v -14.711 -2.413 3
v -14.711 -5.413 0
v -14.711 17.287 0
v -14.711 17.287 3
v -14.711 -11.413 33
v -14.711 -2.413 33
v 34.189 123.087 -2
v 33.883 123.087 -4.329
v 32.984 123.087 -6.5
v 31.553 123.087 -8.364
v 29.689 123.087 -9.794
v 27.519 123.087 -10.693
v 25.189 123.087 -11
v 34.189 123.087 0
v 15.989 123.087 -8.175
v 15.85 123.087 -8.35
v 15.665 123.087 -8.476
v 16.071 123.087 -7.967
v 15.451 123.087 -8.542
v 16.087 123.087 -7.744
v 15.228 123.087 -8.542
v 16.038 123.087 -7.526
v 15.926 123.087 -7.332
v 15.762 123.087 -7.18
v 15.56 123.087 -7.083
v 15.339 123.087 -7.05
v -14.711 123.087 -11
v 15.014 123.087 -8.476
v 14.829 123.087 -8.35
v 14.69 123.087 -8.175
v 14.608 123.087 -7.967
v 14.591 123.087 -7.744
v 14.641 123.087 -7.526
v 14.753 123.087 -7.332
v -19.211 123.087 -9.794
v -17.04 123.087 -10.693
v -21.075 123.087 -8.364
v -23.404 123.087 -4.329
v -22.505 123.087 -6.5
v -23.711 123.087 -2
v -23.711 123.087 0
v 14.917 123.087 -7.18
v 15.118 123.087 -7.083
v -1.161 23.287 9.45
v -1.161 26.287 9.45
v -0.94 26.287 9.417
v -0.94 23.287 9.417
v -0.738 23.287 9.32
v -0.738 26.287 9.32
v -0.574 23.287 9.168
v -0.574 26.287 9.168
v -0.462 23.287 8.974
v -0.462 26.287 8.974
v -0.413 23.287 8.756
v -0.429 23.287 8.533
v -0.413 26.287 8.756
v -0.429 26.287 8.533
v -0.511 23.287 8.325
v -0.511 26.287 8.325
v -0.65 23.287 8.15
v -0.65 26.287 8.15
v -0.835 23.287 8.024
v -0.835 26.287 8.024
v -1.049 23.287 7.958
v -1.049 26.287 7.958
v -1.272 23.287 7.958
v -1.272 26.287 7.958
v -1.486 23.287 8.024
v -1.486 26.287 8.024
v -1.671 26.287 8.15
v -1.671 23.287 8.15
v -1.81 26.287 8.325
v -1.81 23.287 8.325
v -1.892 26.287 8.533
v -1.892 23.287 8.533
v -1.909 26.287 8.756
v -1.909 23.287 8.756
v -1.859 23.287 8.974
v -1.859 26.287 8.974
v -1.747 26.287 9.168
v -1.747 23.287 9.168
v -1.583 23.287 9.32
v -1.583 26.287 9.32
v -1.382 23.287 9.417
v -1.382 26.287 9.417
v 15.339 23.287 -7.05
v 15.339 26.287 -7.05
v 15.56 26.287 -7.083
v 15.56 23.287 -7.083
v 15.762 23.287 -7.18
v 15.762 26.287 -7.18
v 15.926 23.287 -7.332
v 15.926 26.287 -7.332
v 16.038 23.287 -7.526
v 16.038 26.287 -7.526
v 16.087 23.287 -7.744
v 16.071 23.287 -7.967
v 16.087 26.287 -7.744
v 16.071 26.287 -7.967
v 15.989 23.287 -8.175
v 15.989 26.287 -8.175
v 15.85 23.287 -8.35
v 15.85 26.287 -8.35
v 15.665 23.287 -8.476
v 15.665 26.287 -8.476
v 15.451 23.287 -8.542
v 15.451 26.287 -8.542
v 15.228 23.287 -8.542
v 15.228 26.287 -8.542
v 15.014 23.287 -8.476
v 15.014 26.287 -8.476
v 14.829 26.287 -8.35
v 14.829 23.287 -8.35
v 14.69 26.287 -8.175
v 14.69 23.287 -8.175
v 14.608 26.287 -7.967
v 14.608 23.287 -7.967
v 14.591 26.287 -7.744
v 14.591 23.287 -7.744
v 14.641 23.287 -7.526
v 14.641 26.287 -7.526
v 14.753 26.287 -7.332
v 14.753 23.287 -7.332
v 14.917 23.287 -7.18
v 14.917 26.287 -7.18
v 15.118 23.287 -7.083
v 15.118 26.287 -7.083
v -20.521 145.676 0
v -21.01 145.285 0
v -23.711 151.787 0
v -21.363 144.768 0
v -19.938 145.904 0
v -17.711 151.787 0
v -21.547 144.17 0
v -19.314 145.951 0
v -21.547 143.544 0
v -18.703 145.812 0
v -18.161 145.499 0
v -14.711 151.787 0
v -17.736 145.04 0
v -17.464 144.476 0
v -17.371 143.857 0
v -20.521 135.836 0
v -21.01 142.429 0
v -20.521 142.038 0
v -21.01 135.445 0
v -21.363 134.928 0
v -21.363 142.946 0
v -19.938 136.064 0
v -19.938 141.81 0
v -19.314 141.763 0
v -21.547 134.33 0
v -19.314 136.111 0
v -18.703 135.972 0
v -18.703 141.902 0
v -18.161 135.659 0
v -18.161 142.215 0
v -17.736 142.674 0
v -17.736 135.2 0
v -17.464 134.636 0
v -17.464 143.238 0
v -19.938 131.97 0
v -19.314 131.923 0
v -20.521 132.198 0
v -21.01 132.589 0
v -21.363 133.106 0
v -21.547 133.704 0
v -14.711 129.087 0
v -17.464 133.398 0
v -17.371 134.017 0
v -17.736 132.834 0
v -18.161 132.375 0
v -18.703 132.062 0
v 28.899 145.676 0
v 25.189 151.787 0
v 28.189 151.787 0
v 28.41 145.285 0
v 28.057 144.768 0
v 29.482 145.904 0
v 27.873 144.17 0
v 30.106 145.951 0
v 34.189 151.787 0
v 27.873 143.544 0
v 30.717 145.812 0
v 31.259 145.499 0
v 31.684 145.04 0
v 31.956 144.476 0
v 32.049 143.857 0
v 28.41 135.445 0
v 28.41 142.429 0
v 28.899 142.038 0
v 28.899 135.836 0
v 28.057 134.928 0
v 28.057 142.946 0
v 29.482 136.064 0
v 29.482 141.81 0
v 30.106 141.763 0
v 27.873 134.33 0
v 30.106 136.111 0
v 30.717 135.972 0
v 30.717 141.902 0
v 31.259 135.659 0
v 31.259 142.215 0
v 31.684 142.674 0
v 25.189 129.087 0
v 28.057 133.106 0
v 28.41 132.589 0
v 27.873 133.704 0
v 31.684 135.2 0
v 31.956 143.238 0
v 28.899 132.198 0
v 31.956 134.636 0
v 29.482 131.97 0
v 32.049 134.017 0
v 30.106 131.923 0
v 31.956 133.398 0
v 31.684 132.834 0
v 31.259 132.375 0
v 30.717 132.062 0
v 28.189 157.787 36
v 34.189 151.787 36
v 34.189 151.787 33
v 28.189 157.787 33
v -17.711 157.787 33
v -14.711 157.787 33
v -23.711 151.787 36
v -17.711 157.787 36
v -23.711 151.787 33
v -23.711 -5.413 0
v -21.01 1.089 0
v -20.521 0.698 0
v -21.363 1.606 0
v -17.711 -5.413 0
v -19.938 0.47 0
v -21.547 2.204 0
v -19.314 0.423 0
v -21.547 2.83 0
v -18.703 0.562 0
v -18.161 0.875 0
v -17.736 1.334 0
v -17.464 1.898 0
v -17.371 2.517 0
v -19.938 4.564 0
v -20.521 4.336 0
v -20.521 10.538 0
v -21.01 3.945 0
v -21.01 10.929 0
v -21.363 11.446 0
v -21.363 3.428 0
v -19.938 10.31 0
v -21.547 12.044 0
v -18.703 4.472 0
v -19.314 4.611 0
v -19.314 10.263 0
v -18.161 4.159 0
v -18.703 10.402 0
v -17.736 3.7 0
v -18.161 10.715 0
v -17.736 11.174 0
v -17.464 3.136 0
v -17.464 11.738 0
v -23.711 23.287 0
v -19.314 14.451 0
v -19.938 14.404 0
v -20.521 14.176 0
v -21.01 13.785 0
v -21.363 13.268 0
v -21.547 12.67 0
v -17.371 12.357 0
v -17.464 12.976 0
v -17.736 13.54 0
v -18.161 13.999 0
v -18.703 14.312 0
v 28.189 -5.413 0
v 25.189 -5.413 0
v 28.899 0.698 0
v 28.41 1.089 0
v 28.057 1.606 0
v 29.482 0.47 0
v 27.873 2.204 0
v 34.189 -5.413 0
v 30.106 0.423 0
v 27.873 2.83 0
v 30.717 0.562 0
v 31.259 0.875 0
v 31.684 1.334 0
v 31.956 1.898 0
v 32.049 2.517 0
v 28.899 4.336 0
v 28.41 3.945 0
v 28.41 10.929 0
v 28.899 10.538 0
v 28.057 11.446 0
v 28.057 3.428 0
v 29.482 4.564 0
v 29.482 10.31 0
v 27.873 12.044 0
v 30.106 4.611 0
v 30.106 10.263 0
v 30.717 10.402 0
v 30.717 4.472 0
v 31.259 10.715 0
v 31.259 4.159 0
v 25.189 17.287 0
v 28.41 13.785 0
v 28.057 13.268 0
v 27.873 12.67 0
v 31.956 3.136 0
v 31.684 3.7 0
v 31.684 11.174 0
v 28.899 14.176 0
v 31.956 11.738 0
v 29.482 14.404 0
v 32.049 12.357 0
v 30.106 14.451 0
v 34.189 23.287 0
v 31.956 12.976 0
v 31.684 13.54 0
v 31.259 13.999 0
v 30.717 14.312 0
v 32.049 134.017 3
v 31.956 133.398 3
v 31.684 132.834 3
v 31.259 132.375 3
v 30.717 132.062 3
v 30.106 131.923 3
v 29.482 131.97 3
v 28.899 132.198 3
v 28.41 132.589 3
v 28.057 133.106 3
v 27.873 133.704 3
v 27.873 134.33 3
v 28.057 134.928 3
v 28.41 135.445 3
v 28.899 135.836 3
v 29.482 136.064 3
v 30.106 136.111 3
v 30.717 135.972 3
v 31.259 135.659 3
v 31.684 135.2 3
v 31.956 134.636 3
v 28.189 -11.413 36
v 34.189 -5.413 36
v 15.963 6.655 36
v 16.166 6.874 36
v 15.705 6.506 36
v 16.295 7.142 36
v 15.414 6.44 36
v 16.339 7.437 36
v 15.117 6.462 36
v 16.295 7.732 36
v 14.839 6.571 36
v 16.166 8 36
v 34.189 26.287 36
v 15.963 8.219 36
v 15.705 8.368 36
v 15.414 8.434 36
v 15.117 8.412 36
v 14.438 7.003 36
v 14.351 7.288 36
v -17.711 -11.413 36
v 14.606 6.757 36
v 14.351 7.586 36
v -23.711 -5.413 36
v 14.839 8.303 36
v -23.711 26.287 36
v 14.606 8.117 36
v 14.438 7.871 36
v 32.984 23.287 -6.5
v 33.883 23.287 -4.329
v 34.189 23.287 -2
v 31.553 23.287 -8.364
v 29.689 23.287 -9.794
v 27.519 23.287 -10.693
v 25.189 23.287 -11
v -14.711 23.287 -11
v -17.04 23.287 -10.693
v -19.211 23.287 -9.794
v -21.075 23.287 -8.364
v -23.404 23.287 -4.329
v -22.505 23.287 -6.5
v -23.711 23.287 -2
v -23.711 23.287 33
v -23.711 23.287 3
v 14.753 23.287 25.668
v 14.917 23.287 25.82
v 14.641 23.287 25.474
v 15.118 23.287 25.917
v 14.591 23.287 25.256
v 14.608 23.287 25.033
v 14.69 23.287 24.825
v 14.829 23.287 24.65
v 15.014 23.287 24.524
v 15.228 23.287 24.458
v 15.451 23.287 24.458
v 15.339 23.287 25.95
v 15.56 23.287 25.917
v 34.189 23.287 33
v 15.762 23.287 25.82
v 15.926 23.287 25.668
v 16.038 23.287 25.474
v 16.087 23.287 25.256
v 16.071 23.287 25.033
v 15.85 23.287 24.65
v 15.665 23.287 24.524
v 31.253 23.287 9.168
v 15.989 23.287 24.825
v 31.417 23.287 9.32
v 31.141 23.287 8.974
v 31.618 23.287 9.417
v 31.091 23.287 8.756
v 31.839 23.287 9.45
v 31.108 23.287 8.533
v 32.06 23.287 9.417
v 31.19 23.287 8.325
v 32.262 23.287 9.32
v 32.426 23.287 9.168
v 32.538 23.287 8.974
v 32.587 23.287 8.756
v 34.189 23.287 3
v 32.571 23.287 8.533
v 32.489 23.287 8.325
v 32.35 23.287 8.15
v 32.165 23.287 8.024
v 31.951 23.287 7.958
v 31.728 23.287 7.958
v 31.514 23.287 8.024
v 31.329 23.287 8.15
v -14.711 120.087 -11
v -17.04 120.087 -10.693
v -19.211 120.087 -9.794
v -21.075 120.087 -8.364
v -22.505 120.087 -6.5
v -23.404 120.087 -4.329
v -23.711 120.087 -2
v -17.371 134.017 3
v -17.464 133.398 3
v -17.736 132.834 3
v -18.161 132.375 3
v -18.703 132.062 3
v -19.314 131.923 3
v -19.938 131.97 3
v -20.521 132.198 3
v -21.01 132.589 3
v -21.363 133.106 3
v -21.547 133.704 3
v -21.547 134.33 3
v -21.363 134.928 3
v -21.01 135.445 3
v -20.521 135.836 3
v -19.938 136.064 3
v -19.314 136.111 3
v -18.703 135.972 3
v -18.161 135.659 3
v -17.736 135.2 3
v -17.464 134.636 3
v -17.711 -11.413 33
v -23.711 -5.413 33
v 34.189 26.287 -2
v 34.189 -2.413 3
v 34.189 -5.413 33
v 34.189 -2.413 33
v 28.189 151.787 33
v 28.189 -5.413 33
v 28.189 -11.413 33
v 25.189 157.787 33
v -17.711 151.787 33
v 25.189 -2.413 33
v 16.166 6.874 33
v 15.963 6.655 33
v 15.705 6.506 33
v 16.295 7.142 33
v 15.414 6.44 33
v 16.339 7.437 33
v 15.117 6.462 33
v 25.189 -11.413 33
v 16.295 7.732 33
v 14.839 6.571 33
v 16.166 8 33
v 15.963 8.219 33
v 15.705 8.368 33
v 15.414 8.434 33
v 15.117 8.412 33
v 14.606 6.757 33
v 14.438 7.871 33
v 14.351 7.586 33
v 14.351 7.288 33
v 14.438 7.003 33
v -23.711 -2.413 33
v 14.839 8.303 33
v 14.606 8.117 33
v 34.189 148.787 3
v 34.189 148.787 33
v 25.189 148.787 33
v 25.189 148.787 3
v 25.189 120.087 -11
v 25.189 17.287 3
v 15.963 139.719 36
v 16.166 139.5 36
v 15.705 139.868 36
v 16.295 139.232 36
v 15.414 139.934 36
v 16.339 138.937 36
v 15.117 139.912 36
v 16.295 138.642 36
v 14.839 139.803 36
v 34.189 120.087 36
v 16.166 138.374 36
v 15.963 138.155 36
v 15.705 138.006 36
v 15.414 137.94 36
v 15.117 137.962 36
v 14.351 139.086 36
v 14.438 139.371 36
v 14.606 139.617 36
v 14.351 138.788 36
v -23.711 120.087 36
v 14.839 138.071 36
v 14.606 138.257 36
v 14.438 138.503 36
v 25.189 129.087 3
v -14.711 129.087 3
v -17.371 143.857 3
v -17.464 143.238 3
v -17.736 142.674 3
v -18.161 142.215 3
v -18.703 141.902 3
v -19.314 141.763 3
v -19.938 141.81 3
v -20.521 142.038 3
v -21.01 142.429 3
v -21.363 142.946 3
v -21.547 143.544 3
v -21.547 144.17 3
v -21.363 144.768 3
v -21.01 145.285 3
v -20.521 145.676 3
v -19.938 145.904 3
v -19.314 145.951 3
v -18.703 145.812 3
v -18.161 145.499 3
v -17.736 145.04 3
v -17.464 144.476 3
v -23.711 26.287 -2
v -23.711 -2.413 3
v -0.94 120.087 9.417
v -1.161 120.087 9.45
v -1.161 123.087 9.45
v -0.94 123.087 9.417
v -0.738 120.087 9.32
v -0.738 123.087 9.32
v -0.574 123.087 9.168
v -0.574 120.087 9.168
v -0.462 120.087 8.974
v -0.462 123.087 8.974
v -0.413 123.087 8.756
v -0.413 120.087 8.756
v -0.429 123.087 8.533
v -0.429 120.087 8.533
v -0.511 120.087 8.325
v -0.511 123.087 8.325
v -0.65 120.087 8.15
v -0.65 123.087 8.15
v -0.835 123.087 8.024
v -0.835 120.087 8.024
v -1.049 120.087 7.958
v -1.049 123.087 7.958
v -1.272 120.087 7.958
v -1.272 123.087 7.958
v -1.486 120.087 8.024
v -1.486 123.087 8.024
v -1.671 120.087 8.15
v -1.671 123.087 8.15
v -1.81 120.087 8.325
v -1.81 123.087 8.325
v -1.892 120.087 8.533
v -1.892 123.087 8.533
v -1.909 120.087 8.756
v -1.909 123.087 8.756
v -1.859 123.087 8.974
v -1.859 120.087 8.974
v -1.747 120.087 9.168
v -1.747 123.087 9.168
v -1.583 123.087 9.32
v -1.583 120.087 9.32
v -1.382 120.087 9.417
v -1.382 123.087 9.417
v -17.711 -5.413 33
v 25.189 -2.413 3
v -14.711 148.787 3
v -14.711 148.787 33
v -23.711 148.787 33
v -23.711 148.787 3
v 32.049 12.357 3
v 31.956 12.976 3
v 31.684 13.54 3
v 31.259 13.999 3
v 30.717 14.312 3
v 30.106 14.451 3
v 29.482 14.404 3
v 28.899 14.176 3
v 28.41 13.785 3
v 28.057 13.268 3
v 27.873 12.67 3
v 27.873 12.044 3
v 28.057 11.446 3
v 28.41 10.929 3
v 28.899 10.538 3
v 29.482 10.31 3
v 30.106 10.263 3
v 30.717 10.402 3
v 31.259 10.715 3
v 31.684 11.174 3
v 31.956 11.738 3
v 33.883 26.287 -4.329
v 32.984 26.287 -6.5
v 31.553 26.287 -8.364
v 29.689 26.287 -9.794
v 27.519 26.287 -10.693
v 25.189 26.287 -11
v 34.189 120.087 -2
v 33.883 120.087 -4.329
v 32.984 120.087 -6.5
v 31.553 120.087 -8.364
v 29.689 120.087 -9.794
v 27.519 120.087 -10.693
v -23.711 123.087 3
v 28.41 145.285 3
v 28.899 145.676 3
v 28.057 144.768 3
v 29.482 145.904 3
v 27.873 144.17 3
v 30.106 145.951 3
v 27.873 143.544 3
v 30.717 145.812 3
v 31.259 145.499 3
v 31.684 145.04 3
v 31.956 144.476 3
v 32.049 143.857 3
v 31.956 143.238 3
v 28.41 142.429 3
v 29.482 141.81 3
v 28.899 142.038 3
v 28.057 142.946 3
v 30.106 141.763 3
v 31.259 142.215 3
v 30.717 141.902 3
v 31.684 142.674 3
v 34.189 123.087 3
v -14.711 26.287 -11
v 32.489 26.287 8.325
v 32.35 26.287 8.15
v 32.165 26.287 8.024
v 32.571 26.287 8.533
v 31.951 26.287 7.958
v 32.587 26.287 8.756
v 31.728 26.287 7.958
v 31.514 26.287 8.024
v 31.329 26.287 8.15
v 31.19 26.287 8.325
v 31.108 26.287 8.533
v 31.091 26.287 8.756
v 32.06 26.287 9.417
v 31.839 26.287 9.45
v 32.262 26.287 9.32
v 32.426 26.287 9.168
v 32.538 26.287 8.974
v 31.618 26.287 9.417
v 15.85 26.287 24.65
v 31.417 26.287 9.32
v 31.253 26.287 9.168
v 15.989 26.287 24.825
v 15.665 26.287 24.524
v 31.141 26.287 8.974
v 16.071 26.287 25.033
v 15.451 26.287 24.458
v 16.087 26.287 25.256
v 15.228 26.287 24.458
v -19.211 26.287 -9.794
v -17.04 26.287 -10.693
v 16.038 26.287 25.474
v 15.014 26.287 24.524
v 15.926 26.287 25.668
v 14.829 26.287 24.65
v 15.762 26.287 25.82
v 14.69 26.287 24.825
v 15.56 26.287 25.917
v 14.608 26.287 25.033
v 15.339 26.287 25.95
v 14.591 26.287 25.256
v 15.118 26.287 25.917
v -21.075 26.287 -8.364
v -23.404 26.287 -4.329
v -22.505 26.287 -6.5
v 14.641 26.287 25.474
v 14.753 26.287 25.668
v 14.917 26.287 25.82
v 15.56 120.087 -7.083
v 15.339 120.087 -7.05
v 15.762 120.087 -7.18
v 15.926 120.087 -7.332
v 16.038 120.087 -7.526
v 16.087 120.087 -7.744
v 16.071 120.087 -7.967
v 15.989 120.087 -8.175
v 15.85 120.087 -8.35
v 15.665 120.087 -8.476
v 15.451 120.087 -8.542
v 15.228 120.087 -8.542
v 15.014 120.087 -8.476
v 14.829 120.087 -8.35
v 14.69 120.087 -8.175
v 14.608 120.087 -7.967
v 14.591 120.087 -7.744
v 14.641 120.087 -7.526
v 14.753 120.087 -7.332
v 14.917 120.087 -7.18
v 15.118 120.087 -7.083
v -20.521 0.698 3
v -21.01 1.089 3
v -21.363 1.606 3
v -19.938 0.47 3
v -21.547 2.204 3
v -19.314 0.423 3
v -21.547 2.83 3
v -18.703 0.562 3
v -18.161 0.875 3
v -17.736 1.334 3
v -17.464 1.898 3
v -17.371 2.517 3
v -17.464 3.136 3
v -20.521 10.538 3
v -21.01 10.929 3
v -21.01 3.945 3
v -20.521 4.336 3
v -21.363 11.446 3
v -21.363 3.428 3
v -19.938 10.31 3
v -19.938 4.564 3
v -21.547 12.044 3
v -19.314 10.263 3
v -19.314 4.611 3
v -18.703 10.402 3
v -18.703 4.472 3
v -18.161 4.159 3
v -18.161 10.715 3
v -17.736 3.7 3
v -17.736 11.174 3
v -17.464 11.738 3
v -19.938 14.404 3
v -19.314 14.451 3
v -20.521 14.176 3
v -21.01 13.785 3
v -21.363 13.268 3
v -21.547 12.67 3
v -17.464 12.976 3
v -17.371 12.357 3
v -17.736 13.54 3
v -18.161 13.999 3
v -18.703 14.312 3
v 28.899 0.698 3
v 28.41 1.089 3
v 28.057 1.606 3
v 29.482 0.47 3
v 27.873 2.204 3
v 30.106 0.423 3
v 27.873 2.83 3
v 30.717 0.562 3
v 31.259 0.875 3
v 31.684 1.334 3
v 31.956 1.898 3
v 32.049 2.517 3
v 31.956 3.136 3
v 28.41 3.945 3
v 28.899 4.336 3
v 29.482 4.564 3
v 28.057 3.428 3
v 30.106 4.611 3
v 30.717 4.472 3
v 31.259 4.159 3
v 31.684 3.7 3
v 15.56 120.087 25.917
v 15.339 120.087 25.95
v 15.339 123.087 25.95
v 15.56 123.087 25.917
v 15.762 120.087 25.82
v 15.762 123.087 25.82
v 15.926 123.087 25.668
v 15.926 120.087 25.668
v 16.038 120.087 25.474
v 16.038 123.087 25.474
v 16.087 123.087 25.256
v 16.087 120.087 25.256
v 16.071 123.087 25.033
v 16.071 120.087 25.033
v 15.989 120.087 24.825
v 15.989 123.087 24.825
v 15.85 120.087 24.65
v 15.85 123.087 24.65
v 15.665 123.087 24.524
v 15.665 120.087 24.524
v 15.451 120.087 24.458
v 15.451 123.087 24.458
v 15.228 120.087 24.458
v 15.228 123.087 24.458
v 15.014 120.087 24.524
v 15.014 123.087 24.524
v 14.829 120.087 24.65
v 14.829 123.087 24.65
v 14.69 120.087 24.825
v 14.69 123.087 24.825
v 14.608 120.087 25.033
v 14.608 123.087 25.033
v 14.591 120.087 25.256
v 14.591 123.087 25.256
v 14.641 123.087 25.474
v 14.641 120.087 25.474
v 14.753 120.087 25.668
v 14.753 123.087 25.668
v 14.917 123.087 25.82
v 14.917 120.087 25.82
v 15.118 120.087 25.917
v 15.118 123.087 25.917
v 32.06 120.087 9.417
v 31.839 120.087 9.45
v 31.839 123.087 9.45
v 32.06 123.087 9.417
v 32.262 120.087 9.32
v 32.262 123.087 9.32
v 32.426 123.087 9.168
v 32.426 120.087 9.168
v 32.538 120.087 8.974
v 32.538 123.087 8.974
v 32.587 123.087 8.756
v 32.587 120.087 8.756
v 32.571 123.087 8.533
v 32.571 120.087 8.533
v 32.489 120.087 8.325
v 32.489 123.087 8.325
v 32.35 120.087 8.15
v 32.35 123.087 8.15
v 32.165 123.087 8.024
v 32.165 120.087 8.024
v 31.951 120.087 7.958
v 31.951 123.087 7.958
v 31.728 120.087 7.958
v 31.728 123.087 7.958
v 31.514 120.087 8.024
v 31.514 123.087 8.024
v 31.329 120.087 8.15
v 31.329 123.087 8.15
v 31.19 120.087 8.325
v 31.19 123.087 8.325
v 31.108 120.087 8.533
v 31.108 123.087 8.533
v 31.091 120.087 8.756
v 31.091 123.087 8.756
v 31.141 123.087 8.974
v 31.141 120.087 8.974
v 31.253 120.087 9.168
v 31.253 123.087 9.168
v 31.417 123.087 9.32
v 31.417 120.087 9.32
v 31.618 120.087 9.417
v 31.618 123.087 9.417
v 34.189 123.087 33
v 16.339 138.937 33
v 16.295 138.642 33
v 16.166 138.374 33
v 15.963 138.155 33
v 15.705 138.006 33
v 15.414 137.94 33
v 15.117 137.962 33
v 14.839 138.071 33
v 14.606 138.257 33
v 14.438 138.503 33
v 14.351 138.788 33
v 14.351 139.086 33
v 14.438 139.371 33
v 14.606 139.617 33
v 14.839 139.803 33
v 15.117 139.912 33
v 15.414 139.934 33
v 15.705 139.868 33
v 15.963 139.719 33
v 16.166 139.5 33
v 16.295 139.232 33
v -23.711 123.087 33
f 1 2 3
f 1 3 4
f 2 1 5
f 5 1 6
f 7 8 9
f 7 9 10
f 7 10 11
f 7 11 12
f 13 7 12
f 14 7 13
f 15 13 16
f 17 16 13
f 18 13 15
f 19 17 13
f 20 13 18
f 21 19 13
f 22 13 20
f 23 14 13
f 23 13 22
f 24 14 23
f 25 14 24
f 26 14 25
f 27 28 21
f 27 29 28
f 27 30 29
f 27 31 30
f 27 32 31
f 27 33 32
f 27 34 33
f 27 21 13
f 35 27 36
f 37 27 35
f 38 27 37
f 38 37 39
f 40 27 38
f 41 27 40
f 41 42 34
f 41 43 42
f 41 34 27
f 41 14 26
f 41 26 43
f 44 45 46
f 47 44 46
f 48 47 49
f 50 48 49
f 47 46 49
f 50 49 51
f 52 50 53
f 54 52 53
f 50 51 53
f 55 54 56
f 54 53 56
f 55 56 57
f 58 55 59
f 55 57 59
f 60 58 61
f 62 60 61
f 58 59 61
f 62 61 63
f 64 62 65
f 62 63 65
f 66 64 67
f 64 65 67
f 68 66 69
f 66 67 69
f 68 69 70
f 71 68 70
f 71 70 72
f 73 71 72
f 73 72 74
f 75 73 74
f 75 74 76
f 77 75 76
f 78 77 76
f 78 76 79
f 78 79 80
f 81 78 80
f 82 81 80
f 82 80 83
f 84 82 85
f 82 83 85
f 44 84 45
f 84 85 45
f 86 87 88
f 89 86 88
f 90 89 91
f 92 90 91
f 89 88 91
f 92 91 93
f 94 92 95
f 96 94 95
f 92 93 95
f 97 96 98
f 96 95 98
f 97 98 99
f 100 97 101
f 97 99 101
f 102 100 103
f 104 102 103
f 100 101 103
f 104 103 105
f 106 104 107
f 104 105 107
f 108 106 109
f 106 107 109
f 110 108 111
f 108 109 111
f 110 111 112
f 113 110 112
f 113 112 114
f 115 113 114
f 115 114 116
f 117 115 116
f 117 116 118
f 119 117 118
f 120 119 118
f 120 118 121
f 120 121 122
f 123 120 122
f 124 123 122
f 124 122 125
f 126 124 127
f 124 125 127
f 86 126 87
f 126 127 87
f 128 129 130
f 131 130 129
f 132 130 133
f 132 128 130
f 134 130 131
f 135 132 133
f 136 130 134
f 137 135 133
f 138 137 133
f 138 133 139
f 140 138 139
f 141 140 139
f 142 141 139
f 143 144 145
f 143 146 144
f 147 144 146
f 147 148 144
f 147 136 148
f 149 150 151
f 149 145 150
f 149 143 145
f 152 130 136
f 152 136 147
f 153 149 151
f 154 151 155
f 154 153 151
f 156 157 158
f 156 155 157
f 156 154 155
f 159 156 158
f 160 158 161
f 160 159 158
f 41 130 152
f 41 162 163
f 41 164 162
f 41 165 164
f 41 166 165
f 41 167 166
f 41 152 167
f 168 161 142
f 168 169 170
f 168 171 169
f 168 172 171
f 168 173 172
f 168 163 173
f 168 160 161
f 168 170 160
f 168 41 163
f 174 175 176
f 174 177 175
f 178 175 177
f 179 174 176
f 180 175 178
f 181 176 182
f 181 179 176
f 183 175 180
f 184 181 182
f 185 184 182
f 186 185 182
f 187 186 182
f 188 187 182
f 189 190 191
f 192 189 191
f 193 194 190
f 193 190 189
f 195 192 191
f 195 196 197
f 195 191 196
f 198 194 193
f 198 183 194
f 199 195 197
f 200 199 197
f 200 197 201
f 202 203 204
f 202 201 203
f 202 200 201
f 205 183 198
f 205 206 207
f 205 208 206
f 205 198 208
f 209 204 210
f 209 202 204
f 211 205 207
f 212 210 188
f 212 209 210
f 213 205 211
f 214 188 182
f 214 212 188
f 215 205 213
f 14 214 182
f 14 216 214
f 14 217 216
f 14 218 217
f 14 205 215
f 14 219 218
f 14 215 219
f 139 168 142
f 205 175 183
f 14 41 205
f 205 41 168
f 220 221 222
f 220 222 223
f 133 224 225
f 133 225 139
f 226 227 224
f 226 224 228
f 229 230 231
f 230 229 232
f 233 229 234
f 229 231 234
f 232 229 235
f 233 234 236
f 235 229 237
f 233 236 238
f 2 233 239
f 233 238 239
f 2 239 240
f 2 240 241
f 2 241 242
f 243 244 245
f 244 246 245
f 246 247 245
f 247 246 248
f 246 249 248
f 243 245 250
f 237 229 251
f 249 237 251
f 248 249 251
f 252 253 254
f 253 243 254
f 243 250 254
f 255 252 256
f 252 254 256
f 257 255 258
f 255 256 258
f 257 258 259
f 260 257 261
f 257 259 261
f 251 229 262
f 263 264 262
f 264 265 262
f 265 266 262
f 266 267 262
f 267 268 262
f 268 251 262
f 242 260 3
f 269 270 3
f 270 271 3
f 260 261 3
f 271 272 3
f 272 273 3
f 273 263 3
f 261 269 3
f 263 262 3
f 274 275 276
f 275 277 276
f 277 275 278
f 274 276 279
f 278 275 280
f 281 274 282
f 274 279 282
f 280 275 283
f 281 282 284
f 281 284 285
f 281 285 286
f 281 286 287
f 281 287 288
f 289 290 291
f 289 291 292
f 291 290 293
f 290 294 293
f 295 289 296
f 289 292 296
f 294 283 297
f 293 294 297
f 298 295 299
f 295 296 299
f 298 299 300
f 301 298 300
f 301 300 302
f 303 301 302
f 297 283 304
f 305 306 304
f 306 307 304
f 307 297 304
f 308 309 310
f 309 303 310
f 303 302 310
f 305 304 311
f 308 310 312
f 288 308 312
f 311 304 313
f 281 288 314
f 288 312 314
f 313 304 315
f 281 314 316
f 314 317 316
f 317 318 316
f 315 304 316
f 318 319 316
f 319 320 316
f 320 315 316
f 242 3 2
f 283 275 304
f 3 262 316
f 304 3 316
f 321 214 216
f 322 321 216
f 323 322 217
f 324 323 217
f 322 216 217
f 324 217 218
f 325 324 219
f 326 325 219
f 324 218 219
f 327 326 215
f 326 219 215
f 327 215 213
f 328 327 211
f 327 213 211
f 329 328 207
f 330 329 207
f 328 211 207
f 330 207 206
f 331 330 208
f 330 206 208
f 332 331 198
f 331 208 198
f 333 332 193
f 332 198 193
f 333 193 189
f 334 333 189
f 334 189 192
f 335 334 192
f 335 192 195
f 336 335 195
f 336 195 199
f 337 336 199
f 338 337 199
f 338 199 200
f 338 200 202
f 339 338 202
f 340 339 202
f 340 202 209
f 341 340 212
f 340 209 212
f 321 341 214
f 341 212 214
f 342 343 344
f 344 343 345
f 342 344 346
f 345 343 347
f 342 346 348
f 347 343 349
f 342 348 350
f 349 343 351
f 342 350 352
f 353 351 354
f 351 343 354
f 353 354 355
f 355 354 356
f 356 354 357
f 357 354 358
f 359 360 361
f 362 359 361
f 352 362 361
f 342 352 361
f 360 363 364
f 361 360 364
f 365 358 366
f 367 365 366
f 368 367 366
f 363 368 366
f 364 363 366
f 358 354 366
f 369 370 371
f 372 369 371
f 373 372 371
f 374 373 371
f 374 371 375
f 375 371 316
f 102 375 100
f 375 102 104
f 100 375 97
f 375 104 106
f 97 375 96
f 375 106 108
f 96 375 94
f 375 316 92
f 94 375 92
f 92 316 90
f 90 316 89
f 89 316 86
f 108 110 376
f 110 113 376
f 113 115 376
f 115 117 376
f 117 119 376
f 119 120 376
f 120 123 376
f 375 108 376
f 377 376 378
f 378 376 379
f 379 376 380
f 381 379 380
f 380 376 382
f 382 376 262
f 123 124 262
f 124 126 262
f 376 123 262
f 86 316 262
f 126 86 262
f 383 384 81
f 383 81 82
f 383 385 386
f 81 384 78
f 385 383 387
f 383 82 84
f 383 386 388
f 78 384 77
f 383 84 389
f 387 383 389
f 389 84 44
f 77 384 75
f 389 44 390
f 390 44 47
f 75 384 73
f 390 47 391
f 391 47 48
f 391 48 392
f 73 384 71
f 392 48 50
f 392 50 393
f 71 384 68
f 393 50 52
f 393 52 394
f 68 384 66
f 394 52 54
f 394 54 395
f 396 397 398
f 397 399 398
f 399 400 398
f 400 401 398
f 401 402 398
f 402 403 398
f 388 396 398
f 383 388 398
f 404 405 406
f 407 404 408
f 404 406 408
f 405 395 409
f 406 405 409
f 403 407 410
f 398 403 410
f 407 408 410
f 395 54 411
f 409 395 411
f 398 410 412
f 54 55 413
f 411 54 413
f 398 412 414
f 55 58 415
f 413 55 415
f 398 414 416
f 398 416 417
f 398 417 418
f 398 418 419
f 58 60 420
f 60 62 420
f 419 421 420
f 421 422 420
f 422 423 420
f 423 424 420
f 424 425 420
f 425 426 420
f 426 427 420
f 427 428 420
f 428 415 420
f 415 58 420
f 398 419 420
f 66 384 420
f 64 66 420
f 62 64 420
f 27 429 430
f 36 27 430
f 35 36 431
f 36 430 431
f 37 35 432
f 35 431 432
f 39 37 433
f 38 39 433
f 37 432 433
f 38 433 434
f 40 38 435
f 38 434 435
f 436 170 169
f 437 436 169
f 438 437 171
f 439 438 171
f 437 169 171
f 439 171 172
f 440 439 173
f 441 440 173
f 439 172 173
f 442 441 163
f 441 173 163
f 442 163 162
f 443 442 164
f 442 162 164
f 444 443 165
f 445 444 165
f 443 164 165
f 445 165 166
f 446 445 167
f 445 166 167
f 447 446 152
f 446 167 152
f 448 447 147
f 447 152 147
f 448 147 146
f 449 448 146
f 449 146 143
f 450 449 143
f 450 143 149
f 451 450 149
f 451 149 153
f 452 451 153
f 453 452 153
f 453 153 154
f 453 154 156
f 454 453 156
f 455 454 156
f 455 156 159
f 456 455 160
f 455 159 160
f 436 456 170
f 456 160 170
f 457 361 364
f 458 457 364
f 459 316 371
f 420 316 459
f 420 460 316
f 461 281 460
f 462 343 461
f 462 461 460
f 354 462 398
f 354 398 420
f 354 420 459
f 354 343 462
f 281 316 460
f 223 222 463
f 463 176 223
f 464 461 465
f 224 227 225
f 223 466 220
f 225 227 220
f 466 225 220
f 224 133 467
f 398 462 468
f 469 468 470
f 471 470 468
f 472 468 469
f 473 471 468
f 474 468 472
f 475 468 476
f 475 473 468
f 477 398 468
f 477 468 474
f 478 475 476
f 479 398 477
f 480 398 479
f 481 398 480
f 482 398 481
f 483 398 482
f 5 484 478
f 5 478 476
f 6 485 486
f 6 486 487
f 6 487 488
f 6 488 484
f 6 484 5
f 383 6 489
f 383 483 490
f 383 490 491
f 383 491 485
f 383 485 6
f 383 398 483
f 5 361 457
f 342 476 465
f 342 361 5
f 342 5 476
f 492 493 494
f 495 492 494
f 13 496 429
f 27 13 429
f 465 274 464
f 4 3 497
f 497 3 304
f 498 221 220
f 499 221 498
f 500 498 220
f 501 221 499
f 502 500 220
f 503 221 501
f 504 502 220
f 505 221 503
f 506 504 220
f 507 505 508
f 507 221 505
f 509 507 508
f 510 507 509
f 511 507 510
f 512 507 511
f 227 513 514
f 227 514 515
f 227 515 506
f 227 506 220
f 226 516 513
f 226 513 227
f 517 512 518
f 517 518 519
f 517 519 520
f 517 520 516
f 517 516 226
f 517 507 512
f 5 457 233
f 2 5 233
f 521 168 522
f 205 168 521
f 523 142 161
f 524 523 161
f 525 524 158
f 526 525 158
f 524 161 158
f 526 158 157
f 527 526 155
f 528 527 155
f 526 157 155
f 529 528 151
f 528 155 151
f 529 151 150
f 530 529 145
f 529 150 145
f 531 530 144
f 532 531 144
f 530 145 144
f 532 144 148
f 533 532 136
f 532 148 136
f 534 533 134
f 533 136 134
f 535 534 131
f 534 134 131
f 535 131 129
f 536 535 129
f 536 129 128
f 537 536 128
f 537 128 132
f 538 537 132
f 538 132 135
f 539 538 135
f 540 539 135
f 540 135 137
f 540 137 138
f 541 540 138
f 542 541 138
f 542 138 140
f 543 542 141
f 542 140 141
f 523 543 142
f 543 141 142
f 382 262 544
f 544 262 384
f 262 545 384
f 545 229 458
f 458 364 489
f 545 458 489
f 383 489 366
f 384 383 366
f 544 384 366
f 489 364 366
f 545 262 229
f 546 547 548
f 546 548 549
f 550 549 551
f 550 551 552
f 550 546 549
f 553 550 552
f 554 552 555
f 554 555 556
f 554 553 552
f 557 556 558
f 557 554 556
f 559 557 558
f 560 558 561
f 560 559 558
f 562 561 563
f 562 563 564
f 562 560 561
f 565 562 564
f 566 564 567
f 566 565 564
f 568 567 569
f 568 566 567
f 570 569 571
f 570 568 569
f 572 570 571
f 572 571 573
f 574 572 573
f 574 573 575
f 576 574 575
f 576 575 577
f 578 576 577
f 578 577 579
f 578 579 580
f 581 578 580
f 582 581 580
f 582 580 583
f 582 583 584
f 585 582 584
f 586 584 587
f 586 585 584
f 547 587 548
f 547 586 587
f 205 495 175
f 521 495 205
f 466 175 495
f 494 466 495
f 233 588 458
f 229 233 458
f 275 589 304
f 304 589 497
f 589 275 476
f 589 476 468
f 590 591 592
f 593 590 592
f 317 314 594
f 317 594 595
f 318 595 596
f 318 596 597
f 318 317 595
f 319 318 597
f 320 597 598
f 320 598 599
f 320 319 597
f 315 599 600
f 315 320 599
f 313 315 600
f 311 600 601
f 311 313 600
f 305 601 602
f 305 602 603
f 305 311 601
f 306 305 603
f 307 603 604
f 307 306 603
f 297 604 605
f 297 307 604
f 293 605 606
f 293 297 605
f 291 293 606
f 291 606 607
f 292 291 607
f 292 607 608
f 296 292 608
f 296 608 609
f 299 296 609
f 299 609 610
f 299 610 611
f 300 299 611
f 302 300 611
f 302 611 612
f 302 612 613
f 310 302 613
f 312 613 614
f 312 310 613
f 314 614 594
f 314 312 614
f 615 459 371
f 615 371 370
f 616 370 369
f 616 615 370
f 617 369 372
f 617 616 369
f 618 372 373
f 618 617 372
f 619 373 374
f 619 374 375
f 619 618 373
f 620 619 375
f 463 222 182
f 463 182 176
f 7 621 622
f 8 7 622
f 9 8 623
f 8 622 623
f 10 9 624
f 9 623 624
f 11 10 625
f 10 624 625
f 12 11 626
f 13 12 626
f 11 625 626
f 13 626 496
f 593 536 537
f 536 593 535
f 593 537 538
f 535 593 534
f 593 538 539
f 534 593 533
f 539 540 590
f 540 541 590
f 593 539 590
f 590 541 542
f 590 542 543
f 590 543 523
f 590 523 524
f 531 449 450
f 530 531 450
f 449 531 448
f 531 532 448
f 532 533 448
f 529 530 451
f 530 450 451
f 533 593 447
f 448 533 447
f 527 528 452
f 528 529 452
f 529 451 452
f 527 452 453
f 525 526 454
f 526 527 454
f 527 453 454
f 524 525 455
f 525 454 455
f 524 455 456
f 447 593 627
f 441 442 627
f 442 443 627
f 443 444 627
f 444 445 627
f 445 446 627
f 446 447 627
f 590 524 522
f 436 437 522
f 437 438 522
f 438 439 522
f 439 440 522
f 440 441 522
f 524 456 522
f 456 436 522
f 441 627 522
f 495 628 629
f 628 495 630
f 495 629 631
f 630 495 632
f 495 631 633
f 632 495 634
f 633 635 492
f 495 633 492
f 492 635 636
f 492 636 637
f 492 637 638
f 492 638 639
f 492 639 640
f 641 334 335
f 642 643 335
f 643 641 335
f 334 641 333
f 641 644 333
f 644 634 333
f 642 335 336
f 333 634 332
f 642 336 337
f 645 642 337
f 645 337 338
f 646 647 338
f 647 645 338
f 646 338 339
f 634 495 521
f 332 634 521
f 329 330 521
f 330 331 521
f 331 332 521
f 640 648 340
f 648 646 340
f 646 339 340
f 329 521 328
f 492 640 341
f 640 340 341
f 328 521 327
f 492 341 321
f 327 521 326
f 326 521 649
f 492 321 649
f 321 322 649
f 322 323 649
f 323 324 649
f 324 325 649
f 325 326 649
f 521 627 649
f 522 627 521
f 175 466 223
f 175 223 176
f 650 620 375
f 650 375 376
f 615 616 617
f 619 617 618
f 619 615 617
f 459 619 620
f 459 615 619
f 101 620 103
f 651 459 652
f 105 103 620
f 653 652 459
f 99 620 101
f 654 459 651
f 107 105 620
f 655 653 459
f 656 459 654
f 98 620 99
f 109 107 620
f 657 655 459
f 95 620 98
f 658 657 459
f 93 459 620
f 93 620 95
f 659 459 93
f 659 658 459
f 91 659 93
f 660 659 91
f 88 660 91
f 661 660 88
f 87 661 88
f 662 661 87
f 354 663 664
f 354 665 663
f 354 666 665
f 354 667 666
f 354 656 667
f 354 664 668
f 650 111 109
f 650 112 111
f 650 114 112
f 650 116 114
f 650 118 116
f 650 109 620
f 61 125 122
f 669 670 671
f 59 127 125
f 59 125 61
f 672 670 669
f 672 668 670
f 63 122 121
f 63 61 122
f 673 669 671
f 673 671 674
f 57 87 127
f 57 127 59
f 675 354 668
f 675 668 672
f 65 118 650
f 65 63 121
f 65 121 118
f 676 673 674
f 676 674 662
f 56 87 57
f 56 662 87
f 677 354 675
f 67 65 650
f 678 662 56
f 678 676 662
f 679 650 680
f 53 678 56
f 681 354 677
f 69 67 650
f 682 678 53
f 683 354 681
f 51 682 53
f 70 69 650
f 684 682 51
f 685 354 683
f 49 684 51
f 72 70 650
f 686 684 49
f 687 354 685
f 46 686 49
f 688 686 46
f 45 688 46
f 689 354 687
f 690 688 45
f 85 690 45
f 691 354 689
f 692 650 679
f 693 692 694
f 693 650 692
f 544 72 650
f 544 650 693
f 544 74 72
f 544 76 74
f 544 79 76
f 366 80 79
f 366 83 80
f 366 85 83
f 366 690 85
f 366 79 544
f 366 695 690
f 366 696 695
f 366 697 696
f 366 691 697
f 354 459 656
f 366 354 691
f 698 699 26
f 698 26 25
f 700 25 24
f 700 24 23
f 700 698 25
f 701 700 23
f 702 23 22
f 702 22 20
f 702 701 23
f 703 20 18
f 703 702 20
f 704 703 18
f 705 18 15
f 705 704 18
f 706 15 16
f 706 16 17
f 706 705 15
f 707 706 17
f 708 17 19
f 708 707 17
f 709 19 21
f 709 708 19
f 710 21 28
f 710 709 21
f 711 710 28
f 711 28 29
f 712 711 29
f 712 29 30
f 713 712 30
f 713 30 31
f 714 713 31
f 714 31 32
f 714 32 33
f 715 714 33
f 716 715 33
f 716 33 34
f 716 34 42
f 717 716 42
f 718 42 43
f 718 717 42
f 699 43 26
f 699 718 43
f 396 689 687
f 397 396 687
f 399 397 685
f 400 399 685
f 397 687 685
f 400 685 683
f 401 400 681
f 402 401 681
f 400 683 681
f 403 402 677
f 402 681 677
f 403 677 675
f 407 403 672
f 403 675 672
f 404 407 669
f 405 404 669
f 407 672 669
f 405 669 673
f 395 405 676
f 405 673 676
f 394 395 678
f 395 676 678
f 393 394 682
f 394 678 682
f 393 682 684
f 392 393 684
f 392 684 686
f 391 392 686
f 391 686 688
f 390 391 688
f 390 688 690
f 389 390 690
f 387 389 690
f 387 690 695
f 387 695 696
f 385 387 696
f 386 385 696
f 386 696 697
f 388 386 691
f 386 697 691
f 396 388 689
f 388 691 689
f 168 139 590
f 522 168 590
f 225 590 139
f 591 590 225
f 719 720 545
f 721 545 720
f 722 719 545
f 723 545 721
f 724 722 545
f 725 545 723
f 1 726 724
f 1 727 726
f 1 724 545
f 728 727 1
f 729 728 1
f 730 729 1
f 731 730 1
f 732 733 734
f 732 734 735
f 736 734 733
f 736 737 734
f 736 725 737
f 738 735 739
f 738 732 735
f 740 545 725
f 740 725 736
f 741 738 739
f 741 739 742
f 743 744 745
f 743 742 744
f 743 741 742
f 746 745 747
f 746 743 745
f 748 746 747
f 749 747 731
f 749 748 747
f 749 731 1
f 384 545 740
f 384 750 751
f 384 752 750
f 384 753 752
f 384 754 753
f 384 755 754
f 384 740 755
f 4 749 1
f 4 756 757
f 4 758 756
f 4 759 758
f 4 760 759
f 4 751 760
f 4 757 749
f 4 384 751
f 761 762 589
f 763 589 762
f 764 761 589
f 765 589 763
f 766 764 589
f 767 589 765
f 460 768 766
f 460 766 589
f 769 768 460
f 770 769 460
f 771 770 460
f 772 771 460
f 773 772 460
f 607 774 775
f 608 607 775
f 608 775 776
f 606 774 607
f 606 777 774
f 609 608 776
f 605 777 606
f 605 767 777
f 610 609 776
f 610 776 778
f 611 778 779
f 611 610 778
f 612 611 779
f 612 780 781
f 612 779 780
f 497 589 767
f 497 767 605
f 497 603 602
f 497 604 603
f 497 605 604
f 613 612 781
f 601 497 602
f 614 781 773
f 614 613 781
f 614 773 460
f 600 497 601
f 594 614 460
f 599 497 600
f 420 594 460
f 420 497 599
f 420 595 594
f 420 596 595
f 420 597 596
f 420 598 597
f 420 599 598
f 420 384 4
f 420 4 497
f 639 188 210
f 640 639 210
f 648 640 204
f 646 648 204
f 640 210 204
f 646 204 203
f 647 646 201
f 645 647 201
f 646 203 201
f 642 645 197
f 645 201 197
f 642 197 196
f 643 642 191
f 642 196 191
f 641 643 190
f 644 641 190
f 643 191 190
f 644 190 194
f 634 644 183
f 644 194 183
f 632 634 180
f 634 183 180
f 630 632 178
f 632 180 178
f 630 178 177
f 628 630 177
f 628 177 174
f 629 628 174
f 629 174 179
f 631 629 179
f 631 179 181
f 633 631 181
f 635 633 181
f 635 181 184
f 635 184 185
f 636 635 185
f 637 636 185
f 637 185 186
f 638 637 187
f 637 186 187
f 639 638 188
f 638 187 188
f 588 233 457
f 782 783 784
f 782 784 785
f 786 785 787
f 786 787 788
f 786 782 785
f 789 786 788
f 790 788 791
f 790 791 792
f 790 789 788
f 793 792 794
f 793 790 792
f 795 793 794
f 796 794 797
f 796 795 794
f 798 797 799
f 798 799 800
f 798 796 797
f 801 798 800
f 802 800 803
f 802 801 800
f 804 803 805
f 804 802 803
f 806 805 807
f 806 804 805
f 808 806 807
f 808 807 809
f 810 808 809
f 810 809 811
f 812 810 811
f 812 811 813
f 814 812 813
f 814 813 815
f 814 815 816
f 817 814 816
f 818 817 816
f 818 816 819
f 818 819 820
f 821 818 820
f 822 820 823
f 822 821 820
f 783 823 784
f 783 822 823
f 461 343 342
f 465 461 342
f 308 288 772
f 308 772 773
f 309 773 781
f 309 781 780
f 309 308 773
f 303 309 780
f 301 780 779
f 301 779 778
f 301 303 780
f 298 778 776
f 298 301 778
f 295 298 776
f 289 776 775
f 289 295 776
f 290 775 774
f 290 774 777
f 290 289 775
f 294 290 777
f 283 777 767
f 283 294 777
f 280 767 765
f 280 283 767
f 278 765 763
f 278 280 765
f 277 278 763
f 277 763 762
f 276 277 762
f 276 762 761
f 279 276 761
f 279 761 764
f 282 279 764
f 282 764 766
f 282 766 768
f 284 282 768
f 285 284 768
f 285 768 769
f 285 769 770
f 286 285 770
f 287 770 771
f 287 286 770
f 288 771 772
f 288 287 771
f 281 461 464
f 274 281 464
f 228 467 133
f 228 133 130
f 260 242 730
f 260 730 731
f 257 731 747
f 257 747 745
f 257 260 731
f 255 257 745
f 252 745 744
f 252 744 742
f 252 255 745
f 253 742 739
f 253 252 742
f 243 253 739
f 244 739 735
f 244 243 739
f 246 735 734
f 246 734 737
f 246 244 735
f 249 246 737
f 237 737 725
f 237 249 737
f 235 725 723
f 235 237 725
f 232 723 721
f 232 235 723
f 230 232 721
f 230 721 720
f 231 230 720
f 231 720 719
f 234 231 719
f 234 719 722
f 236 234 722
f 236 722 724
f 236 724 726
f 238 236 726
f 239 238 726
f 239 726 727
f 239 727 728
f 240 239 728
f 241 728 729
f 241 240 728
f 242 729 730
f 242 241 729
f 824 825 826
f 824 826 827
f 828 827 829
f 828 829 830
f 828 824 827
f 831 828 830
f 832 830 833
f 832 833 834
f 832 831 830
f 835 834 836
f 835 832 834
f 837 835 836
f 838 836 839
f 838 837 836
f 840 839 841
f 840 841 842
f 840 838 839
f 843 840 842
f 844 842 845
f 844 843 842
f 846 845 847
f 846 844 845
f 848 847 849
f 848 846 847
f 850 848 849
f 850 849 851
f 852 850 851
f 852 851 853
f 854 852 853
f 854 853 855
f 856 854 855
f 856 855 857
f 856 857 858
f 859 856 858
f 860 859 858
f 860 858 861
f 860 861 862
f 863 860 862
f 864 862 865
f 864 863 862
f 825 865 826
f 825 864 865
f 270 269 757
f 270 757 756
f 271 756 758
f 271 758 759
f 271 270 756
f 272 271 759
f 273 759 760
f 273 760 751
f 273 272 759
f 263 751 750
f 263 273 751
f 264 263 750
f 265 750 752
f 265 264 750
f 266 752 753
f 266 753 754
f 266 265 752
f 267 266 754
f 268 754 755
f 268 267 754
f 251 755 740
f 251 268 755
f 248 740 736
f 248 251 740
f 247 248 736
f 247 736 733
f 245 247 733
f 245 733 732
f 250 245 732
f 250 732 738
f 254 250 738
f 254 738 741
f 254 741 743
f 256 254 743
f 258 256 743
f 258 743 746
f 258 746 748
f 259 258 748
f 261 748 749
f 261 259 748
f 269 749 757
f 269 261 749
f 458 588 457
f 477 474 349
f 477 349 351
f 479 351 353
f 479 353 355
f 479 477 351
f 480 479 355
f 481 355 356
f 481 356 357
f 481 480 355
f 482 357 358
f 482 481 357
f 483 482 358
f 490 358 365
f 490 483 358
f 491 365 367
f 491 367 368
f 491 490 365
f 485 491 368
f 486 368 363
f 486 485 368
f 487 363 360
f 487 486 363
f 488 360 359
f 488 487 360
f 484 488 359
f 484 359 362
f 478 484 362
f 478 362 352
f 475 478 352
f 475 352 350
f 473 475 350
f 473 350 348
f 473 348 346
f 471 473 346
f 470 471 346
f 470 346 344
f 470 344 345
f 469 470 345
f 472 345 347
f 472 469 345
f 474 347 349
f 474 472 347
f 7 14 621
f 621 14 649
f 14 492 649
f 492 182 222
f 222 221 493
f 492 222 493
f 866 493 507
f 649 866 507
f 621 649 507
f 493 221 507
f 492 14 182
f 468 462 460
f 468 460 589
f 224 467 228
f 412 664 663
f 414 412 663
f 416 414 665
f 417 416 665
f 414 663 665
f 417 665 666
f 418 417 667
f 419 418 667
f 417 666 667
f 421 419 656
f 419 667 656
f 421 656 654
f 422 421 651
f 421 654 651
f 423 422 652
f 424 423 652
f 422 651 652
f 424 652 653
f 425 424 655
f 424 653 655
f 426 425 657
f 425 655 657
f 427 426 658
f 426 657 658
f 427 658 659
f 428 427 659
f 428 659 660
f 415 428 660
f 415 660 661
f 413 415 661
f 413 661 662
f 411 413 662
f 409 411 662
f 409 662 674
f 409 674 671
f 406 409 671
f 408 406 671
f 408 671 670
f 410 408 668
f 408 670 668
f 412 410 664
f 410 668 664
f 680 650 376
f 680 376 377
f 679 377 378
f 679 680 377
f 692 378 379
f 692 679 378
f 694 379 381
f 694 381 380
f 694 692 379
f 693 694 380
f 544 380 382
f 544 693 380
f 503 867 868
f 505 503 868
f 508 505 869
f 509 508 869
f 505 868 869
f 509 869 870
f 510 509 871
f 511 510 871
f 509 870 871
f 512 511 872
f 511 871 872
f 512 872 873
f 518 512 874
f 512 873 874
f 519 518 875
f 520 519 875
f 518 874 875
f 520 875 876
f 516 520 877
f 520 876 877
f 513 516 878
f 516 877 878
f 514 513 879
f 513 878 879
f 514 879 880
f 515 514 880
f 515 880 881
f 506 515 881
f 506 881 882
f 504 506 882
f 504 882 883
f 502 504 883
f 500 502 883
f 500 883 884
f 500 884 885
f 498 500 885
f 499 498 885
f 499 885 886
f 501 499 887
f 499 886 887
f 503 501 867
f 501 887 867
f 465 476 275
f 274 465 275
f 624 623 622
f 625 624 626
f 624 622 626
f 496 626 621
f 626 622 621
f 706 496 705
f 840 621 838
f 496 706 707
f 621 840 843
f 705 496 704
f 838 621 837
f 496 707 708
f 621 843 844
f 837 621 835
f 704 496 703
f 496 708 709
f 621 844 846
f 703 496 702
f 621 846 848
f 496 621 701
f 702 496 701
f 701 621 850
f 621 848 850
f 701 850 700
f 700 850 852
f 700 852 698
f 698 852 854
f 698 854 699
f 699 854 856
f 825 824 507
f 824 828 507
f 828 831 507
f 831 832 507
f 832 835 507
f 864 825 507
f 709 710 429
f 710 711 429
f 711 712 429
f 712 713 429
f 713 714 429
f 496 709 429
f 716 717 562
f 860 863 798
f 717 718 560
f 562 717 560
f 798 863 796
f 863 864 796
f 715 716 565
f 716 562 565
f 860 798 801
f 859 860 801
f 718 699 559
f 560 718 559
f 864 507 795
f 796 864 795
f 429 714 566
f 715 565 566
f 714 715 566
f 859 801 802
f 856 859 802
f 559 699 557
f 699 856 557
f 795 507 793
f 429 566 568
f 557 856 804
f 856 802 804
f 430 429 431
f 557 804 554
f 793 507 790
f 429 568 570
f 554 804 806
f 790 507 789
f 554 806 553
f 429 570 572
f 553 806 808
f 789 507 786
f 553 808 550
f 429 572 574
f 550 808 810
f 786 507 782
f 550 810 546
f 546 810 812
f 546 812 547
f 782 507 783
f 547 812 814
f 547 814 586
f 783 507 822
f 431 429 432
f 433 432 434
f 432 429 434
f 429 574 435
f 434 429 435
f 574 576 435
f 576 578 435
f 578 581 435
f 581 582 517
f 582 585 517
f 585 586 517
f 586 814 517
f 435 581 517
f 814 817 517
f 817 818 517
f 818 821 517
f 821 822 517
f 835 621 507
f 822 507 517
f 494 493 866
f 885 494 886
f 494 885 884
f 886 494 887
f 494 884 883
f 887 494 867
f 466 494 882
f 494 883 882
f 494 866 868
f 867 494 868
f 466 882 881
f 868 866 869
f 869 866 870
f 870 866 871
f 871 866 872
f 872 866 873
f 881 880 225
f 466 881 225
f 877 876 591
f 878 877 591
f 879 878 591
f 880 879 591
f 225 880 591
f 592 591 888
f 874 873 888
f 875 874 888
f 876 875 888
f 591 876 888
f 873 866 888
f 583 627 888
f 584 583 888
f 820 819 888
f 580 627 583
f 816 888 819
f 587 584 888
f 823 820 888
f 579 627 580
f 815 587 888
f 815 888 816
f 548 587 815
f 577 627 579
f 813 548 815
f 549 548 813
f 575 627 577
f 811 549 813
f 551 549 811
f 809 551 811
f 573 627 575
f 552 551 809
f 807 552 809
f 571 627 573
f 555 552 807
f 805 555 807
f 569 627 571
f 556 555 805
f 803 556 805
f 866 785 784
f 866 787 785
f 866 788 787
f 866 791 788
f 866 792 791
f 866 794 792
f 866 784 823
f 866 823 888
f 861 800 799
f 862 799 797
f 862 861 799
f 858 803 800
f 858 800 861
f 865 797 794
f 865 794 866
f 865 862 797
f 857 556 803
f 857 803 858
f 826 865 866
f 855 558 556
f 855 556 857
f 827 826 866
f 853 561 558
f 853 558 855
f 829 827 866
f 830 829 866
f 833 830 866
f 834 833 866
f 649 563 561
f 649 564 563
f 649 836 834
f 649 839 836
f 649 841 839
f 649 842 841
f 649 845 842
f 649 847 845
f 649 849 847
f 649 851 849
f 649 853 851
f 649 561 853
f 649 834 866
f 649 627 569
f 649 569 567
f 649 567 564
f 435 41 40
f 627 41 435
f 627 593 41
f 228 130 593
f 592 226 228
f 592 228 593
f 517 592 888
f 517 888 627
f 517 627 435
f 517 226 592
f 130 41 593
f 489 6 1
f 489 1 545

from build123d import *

# Parameters (mm, degrees)
SKETCH_1_W          = 57.9
SKETCH_1_H          = 37.7
SKETCH_1_R          = 2.1
SKETCH_1_W_2        = 39.9
SKETCH_1_H_2        = 19.7
EXTRUDE_1_DEPTH     = 3
SKETCH_2_W          = 57.9
SKETCH_2_H          = 3
EXTRUDE_2_DEPTH     = 30
SKETCH_3_R          = 1
EXTRUDE_3_DEPTH     = 3
SKETCH_9_W          = 57.9
SKETCH_9_H          = 3
EXTRUDE_4_DEPTH     = 11
SKETCH_10_R         = 0.75
CUT_EXTRUDE_3_DEPTH = 3
SKETCH_11_W         = 9
SKETCH_11_H         = 3
EXTRUDE_5_DEPTH     = 32
CUT_EXTRUDE_4_DEPTH = 9
EXTRUDE_6_DEPTH     = 3
SKETCH_17_W         = 3
SKETCH_17_H         = 33
EXTRUDE_7_DEPTH     = 6
CUT_EXTRUDE_5_DEPTH = 52


with BuildPart() as part:
    # 草图1 → 凸台-拉伸1 (new body)
    with BuildSketch(Plane.XY):
        with Locations((5.239385195, 7.436956636)):
            Rectangle(SKETCH_1_W, SKETCH_1_H)
        with Locations((-19.470614805, 12.356956636)):
            Circle(SKETCH_1_R, mode=Mode.SUBTRACT)
        with Locations((-19.470614805, 2.516956636)):
            Circle(SKETCH_1_R, mode=Mode.SUBTRACT)
        with Locations((29.949385195, 12.356956636)):
            Circle(SKETCH_1_R, mode=Mode.SUBTRACT)
        with Locations((29.949385195, 2.516956636)):
            Circle(SKETCH_1_R, mode=Mode.SUBTRACT)
        with Locations((5.239385195, 7.436956636)):
            Rectangle(SKETCH_1_W_2, SKETCH_1_H_2, mode=Mode.SUBTRACT)
    extrude(amount=EXTRUDE_1_DEPTH)

    # 草图2 → 凸台-拉伸2 (add)
    with BuildSketch(Plane.XY.offset(3)):
        with Locations((5.239385195, 24.786956636)):
            Rectangle(SKETCH_2_W, SKETCH_2_H)
    extrude(amount=EXTRUDE_2_DEPTH)

    # 草图3 → 凸台-拉伸3 (add)
    with BuildSketch(Plane.XY.offset(33)):
        Polygon((-14.710614805, 26.286956636), (-23.710614805, 26.286956636), (-23.710614805, -2.413043364), (-23.710614805, -5.413043364), (34.189385195, -5.413043364), (34.189385195, -2.413043364), (34.189385195, 26.286956636), (25.189385195, 26.286956636), align=None)
        with Locations((15.339385195, 7.436956636)):
            Circle(SKETCH_3_R, mode=Mode.SUBTRACT)
    extrude(amount=EXTRUDE_3_DEPTH)

    # 草图9 → 凸台-拉伸4 (add)
    with BuildSketch(Plane(origin=(0, 0, 0), x_dir=(-1, 0, 0), z_dir=(0, 0, -1))):
        with Locations((-5.239385195, 24.786956636)):
            Rectangle(SKETCH_9_W, SKETCH_9_H)
    extrude(amount=EXTRUDE_4_DEPTH)

    # 草图10 → 切除-拉伸3 (cut)
    with BuildSketch(Plane(origin=(0, 26.286956636, 0), x_dir=(1, 0, 0), z_dir=(0, 1, 0))):
        with Locations(Location((15.339385195, 7.8, 0), (0, 0, 270))):
            Circle(SKETCH_10_R)
        with Locations(Location((31.839385195, -8.7, 0), (0, 0, 270))):
            Circle(SKETCH_10_R)
        with Locations(Location((15.339385195, -25.2, 0), (0, 0, 270))):
            Circle(SKETCH_10_R)
        with Locations(Location((-1.160614805, -8.7, 0), (0, 0, 270))):
            Circle(SKETCH_10_R)
        with BuildLine():
            Line((-23.710614805, 2), (-23.710614805, 11))
            Line((-23.710614805, 11), (-14.710614805, 11))
            ThreePointArc((-14.710614805, 11), (-21.074575836, 8.363961031), (-23.710614805, 2))
        make_face()
        with BuildLine():
            Line((25.189385195, 11), (34.189385195, 11))
            Line((34.189385195, 11), (34.189385195, 2))
            ThreePointArc((34.189385195, 2), (31.553346226, 8.363961031), (25.189385195, 11))
        make_face()
    extrude(amount=-CUT_EXTRUDE_3_DEPTH, mode=Mode.SUBTRACT)


with BuildPart() as body_2:
    # 镜向1: mirrored copy
    add(part.part.mirror(Plane.ZX.offset(73.186956636)))


with BuildPart() as part_1:
    add(part.part)

    # 草图11 → 凸台-拉伸5 (add)
    with BuildSketch(Plane(origin=(0, 0, 33), x_dir=(-1, 0, 0), z_dir=(0, 0, -1))):
        with Locations((19.210614805, -3.913043364)):
            Rectangle(SKETCH_11_W, SKETCH_11_H)
        with Locations((-29.689385195, -3.913043364)):
            Rectangle(SKETCH_11_W, SKETCH_11_H)
    extrude(amount=EXTRUDE_5_DEPTH)

    # 草图12 → 切除-拉伸4 (cut)
    with BuildSketch(Plane(origin=(0, 0, 0), x_dir=(-1, 0, 0), z_dir=(0, 0, -1))):
        Polygon((-25.189385195, -2.413043364), (-25.189385195, -5.413043364), (-34.189385195, -5.413043364), (-34.189385195, -11.413043364), (23.710614805, -11.413043364), (23.710614805, -5.413043364), (14.710614805, -5.413043364), (14.710614805, -2.413043364), align=None)
    extrude(amount=-CUT_EXTRUDE_4_DEPTH, mode=Mode.SUBTRACT)

    # 草图13 → 凸台-拉伸6 (add)
    with BuildSketch(Plane.XY.offset(36)):
        Polygon((-23.710614805, -5.413043364), (34.189385195, -5.413043364), (28.189385195, -11.413043364), (-17.710614805, -11.413043364), align=None)
    extrude(amount=-EXTRUDE_6_DEPTH)

    # 草图17 → 凸台-拉伸7 (add)
    with BuildSketch(Plane.XZ.offset(5.413043364)):
        with Locations((-16.210614805, 16.5)):
            Rectangle(SKETCH_17_W, SKETCH_17_H)
        with Locations((26.689385195, 16.5)):
            Rectangle(SKETCH_17_W, SKETCH_17_H)
    extrude(amount=EXTRUDE_7_DEPTH)

    # 草图19 → 切除-拉伸5 (cut)
    with BuildSketch(Plane.ZY.offset(17.710614805)):
        Polygon((0, -5.413043364), (0, -11.413043364), (33, -11.413043364), align=None)
    extrude(amount=-CUT_EXTRUDE_5_DEPTH, mode=Mode.SUBTRACT)


with BuildPart() as body_2_2:
    # 镜向2: mirrored copy
    add(part_1.part.mirror(Plane.ZX.offset(73.186956636)))


solid = Compound([part_1.part, body_2_2.part])
